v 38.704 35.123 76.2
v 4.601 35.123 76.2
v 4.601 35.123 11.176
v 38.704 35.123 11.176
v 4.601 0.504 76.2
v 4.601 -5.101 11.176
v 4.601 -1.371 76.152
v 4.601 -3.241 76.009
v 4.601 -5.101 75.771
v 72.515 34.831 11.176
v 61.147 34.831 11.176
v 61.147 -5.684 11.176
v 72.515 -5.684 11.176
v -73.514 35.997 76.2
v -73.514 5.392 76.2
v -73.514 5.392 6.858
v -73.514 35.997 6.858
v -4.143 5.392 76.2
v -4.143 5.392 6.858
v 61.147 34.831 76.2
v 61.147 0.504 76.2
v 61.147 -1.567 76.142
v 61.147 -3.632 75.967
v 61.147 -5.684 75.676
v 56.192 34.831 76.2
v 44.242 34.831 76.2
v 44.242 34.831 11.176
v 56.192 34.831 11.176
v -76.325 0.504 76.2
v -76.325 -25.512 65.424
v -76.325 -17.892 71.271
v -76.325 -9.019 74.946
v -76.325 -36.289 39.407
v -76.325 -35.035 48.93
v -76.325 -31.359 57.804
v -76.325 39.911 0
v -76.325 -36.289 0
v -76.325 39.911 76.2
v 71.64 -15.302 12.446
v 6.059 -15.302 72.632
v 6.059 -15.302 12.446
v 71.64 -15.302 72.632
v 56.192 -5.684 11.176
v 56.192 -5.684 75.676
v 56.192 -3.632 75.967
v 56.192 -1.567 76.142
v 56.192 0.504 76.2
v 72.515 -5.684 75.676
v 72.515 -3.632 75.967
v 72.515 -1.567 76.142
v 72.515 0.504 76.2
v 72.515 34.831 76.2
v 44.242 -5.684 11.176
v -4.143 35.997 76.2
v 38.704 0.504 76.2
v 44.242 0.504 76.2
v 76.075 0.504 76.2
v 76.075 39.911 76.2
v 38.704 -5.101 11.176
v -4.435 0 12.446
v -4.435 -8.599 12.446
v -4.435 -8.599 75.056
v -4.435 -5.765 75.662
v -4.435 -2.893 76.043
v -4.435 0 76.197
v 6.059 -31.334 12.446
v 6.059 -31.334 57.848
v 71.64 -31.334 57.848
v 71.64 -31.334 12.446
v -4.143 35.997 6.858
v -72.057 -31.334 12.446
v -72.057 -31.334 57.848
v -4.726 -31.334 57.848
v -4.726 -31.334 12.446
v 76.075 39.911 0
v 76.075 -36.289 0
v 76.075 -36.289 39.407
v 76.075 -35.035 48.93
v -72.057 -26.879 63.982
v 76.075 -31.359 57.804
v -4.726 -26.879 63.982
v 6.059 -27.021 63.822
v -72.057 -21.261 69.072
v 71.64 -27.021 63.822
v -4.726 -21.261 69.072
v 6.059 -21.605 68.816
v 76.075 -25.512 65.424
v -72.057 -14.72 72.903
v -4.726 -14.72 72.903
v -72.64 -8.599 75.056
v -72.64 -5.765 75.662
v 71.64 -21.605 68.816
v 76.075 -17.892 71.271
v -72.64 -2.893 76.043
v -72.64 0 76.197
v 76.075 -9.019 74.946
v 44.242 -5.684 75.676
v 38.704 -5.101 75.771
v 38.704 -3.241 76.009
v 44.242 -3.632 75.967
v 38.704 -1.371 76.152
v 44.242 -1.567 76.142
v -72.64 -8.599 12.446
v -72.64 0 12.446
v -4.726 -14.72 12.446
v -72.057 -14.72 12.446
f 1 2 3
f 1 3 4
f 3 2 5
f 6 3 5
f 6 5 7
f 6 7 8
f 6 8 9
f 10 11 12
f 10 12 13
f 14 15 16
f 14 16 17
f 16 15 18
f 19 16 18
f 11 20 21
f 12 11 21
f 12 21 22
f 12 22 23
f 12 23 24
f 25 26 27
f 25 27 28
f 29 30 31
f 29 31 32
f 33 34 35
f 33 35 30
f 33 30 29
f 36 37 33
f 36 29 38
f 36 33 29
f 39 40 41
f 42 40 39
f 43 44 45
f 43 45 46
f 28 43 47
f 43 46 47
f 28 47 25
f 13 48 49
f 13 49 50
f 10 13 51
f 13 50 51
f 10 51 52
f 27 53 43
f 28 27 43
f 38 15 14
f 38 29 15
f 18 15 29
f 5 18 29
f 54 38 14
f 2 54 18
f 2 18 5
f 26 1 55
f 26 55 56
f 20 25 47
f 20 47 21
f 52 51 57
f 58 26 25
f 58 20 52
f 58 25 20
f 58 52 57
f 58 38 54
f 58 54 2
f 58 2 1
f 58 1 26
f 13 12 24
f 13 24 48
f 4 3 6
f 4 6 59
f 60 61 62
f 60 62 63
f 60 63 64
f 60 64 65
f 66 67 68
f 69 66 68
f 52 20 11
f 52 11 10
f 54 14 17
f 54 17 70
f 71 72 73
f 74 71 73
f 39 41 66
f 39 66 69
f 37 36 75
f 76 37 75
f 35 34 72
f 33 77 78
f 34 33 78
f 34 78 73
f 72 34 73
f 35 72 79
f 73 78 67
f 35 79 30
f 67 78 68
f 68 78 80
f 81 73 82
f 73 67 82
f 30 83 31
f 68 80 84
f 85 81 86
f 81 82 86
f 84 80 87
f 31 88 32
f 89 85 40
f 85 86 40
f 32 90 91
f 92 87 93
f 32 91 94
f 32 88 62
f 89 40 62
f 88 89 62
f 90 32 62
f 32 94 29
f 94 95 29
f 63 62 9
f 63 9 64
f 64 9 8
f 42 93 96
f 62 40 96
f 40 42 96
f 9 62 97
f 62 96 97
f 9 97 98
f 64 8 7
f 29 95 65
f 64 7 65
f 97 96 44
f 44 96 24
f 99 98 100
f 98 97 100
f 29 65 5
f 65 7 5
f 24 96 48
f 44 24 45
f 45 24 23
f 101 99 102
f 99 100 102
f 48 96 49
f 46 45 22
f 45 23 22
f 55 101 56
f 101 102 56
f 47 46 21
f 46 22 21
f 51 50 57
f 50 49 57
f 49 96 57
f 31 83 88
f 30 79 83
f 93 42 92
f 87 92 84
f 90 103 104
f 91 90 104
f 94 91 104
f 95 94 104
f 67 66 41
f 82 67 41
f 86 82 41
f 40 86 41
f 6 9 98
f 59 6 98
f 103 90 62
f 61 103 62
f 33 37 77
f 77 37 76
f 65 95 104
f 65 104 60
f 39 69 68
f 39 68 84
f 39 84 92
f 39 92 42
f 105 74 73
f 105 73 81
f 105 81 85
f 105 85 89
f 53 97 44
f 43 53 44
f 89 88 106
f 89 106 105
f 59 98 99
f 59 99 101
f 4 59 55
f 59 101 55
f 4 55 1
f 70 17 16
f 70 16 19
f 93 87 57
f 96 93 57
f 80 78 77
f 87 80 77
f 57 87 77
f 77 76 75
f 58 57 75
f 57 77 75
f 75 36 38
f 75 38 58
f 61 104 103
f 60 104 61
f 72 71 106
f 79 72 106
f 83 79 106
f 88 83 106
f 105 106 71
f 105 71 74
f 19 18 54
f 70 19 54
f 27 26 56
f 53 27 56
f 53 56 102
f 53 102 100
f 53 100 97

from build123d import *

# Parameters (mm, degrees)
F0_W      = 152.4
F0_H      = 76.2
F1_DEPTH  = 76.2
F2_R      = 36.7926146906
F3_W      = 69.3711452186
F3_H      = 30.6049170904
F4_DEPTH  = 69.342
F5_W      = 34.1026219539
F5_H      = 34.6188608486
F5_H_2    = 5.6047446165
F5_W_2    = 11.9504891336
F5_H_3    = 34.3273866851
F5_H_4    = 6.1876957375
F5_W_3    = 11.3675482571
F6_DEPTH  = 65.024
F7_W      = 65.5819708481
F7_H      = 16.0311469808
F8_DEPTH  = 83.82
F9_DEPTH  = 66.548
F7_W_2    = 68.2052476332
F7_H_2    = 8.5985241458
F7_W_3    = 67.330816295
F7_H_3    = 16.6140981019
F10_DEPTH = 100.076
F11_DEPTH = 87.63


with BuildPart() as f1:
    # F0 (on Top) → F1 (new body)
    with BuildSketch(Plane.XY):
        with Locations((-0.1249154925, 1.811310178)):
            Rectangle(F0_W, F0_H)
    extrude(amount=F1_DEPTH)

    # F2
    f2_edges = [f1.edges().sort_by_distance(p)[0] for p in [
        (-0.124915, -36.28869, 76.2),
    ]]
    fillet(f2_edges, radius=F2_R)

    # F3 (on face) → F4 (cut)
    with BuildSketch(Plane.XY.offset(76.2)):
        with Locations((-38.8286877424, 20.6947533879)):
            Rectangle(F3_W, F3_H)
    extrude(amount=-F4_DEPTH, mode=Mode.SUBTRACT)

    # F5 (on face) → F6 (cut)
    with BuildSketch(Plane.XY.offset(76.2)):
        with Locations((21.6524621937, 17.8133552929)):
            Rectangle(F5_W, F5_H)
        with Locations((21.6524621937, -2.2984474396)):
            Rectangle(F5_W, F5_H_2)
        with Locations((50.2170491964, 17.6676182112)):
            Rectangle(F5_W_2, F5_H_3)
        with Locations((50.2170491964, -2.5899230002)):
            Rectangle(F5_W_2, F5_H_4)
        with Locations((66.8311472982, 17.6676182112)):
            Rectangle(F5_W_3, F5_H_3)
        with Locations((66.8311472982, -2.5899230002)):
            Rectangle(F5_W_3, F5_H_4)
    extrude(amount=-F6_DEPTH, mode=Mode.SUBTRACT)

    # F7 (on Top) → F8 (join)
    with BuildSketch(Plane.XY):
        with Locations((38.8495135121, -23.3180331998)):
            Rectangle(F7_W, F7_H)
    extrude(amount=F8_DEPTH)

    # F9 (cut): a face of the model
    f9_faces = [f1.faces().sort_by_distance(p)[0] for p in [
        (38.8495135121, -23.3180331998, 83.82),
    ]]
    extrude(f9_faces, amount=-F9_DEPTH, mode=Mode.SUBTRACT)

    # F7 (on Top) → F10 (join)
    with BuildSketch(Plane.XY):
        with Locations((-38.5372140445, -4.2992620729)):
            Rectangle(F7_W_2, F7_H_2)
        with Locations((-38.3914739359, -23.0265576392)):
            Rectangle(F7_W_3, F7_H_3)
        with Locations((38.8495135121, -23.3180331998)):
            Rectangle(F7_W, F7_H)
    extrude(amount=F10_DEPTH)

    # F11 (cut): faces of the model
    f11_faces = [f1.faces().sort_by_distance(p)[0] for p in [
        (-38.3914739359, -23.0265576392, 100.076),
        (-38.5372140445, -4.2992620729, 100.076),
        (38.8495135121, -23.3180331998, 100.076),
    ]]
    extrude(f11_faces, amount=-F11_DEPTH, mode=Mode.SUBTRACT)


solid = f1.part
